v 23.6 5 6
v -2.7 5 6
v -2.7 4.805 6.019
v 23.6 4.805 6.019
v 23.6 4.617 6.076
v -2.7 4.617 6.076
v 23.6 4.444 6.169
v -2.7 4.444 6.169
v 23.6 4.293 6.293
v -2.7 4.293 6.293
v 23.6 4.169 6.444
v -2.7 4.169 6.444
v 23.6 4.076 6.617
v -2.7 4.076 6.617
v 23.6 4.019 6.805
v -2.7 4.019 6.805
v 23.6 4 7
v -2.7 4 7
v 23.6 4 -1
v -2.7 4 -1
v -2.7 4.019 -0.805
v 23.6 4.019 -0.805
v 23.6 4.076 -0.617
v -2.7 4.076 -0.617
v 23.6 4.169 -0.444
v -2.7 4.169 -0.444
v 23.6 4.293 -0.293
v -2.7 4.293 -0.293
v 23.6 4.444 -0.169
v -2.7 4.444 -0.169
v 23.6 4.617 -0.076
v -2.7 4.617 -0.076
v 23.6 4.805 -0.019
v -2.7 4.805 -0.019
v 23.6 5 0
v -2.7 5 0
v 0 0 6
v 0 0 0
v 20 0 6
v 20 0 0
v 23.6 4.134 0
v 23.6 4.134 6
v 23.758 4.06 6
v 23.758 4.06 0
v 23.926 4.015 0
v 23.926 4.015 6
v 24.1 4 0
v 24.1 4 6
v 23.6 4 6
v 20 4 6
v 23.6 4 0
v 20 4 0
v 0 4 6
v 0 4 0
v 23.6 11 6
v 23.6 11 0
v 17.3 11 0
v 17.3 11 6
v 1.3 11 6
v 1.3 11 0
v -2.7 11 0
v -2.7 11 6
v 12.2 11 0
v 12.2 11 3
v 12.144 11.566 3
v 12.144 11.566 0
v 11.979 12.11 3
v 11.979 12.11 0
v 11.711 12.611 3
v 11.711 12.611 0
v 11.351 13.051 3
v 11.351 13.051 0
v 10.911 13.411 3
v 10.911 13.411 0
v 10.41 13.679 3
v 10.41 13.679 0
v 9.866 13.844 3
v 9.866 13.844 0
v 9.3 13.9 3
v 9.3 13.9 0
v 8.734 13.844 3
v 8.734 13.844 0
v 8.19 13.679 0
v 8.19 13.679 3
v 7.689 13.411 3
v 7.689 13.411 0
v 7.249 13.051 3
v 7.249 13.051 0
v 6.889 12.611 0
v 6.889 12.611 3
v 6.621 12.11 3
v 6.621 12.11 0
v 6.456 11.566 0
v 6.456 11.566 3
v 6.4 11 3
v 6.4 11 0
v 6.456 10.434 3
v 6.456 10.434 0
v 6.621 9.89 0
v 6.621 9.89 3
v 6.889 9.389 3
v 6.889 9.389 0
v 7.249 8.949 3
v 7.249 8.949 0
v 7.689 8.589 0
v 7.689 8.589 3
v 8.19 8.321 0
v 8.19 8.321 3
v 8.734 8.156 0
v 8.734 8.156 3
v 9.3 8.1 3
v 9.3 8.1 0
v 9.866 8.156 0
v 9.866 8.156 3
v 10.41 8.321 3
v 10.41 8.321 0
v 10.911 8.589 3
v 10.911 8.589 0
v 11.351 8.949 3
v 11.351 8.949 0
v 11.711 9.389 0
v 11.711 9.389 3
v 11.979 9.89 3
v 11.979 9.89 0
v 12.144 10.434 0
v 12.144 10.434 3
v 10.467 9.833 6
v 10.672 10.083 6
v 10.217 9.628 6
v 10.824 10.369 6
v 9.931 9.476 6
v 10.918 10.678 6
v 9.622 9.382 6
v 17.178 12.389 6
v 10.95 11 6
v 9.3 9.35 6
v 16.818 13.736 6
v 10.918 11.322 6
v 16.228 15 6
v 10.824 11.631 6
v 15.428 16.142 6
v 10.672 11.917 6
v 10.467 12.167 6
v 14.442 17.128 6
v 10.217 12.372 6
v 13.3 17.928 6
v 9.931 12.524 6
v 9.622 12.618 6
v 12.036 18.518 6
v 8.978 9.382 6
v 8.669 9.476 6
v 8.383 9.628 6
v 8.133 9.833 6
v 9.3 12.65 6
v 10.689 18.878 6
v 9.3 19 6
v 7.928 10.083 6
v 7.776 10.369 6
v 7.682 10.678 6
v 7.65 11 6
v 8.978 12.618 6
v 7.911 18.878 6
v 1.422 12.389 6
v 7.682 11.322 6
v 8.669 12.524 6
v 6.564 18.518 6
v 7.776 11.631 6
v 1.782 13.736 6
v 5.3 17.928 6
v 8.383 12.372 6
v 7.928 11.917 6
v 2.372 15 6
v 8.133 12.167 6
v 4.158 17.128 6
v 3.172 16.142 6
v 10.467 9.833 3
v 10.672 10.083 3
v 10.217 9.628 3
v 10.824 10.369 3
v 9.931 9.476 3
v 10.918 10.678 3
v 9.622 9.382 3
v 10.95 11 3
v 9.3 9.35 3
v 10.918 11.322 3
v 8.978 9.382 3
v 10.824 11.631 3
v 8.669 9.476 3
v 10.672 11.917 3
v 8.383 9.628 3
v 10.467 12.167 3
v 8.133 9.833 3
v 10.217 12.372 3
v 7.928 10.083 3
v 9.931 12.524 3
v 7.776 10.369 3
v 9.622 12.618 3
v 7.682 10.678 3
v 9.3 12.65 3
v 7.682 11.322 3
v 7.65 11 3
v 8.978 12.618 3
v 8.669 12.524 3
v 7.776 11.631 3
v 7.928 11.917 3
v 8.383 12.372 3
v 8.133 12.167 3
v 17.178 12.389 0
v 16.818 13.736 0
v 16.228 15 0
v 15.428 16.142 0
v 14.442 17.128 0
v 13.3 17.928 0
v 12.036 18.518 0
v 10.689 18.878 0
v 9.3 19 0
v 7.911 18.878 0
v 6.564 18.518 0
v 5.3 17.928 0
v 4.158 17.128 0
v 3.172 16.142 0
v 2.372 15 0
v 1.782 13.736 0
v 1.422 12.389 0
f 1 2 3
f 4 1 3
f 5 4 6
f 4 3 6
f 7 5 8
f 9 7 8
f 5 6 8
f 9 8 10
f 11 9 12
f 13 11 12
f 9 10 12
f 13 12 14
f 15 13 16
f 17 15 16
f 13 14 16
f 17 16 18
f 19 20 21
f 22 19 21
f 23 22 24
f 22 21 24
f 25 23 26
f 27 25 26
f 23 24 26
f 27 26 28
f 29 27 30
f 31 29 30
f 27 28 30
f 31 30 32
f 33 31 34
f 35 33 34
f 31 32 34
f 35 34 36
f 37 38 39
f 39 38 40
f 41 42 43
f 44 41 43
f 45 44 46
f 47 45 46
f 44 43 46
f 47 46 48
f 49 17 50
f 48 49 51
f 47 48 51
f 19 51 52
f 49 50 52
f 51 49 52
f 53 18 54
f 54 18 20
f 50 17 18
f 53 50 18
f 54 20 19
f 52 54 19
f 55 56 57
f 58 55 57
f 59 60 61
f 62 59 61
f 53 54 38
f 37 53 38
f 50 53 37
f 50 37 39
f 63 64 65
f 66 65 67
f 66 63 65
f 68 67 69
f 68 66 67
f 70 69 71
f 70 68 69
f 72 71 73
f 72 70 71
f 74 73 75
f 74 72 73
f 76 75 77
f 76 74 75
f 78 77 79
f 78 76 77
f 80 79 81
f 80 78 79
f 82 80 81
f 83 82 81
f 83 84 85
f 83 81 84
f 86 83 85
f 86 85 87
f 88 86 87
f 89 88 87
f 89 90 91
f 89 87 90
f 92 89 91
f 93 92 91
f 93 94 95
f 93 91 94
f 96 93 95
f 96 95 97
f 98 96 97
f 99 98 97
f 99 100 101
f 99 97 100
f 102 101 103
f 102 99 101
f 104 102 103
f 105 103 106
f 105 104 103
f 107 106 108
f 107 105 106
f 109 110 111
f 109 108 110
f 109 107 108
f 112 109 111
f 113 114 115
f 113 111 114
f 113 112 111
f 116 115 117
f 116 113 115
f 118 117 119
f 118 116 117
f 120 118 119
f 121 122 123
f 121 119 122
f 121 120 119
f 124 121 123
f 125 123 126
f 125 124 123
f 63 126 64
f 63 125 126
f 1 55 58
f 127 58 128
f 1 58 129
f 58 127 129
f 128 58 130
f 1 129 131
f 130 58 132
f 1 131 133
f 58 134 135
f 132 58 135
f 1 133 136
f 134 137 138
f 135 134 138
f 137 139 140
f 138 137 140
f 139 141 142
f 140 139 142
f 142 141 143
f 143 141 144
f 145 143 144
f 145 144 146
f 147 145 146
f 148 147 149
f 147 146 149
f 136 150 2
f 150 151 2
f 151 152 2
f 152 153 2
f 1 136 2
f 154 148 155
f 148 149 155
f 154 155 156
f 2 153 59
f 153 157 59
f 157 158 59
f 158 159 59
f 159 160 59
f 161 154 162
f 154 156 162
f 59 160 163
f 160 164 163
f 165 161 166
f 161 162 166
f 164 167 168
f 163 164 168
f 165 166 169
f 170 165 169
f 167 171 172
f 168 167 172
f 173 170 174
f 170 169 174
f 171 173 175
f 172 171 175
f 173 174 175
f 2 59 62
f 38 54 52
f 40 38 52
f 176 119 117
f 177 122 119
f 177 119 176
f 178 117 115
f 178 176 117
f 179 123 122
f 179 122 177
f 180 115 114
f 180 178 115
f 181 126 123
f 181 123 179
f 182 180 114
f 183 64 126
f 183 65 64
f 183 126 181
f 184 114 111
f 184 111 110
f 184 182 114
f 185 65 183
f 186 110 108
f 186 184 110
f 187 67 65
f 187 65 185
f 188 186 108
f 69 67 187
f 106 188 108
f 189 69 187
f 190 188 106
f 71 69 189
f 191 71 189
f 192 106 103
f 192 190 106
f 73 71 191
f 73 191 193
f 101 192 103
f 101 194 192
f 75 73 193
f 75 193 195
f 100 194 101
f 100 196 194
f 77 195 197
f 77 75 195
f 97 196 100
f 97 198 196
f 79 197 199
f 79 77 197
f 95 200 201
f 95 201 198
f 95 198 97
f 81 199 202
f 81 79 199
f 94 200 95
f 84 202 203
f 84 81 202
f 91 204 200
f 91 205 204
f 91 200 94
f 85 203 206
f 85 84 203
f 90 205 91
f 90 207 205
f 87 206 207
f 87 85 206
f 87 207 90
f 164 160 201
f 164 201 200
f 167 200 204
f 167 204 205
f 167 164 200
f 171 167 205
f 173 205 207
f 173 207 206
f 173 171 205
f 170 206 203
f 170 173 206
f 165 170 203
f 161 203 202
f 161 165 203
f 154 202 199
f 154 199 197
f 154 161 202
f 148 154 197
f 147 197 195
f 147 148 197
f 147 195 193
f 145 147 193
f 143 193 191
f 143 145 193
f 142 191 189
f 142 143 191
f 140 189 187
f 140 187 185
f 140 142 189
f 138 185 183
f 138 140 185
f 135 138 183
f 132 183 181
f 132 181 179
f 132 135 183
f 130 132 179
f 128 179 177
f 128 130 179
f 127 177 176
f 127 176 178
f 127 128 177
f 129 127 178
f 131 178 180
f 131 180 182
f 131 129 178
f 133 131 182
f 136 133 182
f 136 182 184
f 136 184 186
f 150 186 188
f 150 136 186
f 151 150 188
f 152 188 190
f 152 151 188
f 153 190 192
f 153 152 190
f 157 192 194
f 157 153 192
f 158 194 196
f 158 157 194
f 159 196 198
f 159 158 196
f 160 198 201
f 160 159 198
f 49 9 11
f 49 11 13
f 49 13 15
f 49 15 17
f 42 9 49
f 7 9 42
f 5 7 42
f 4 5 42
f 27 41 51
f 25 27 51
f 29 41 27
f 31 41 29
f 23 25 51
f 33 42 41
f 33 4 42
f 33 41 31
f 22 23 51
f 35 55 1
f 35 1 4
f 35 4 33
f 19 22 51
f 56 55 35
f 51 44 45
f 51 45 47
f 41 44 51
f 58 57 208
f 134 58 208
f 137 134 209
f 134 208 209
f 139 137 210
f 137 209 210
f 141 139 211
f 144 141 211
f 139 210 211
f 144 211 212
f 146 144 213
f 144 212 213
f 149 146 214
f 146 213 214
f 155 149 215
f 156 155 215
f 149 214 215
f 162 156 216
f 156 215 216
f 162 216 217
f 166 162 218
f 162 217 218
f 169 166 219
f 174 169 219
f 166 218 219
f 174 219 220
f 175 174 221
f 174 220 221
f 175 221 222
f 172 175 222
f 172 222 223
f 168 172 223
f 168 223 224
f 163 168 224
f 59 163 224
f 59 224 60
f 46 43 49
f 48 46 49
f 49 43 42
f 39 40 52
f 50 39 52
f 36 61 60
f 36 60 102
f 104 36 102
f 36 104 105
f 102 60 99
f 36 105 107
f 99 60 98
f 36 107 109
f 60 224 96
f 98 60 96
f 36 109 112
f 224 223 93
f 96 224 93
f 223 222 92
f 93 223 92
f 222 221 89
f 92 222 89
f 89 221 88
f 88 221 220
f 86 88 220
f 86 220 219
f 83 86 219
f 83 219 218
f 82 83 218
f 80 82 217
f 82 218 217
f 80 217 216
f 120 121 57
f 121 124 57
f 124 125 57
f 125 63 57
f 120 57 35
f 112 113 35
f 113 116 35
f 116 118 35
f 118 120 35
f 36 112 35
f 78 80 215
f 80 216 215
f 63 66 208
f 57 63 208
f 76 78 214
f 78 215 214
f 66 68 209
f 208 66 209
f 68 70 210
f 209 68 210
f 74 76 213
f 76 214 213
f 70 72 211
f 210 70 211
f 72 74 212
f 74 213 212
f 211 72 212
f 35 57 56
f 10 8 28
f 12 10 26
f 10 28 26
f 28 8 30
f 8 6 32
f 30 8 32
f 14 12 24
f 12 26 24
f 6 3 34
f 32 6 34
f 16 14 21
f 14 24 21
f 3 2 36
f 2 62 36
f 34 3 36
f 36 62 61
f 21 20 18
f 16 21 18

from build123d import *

# Parameters (mm, degrees)
SKETCH1_R           = 2.9
BOSS_EXTRUDE1_DEPTH = 6
BOSS_EXTRUDE2_DEPTH = 26.3
BOSS_EXTRUDE3_DEPTH = 6
SKETCH5_R           = 2.9
SKETCH5_R_2         = 1.65
BOSS_EXTRUDE4_DEPTH = 3


with BuildPart() as part:
    # Sketch1 → Boss-Extrude1 (new body)
    with BuildSketch(Plane.XY):
        with BuildLine():
            Line((0, 0), (20, 0))
            Line((20, 0), (20, 4))
            Line((20, 4), (23.6, 4))
            Line((23.6, 4), (23.6, 11))
            Line((23.6, 11), (17.3, 11))
            ThreePointArc((17.3, 11), (9.3, 19), (1.3, 11))
            Line((1.3, 11), (-2.7, 11))
            Line((-2.7, 11), (-2.7, 4))
            Line((-2.7, 4), (0, 4))
            Line((0, 4), (0, 0))
        make_face()
        with Locations((9.3, 11)):
            Circle(SKETCH1_R, mode=Mode.SUBTRACT)
    extrude(amount=BOSS_EXTRUDE1_DEPTH)

    # Sketch2 → Boss-Extrude2 (add)
    with BuildSketch(Plane.ZY.offset(2.7)):
        with BuildLine():
            Line((6, 4), (6, 5))
            ThreePointArc((6, 5), (6.292893219, 4.292893219), (7, 4))
            Line((7, 4), (6, 4))
        make_face()
        with BuildLine():
            Line((0, 4), (-1, 4))
            ThreePointArc((-1, 4), (-0.292893219, 4.292893219), (0, 5))
            Line((0, 5), (0, 4))
        make_face()
    extrude(amount=-BOSS_EXTRUDE2_DEPTH)

    # Sketch4 → Boss-Extrude3 (add)
    with BuildSketch(Plane.XY.offset(6)):
        with BuildLine():
            Line((23.1, 4), (23.1, 5))
            ThreePointArc((23.1, 5), (23.392893219, 4.292893219), (24.1, 4))
            Line((24.1, 4), (23.1, 4))
        make_face()
        with BuildLine():
            Line((-1.5, 4), (-2.5, 4))
            ThreePointArc((-2.5, 4), (-1.792893219, 4.292893219), (-1.5, 5))
            Line((-1.5, 5), (-1.5, 4))
        make_face()
    extrude(amount=-BOSS_EXTRUDE3_DEPTH)

    # Sketch5 → Boss-Extrude4 (add)
    with BuildSketch(Plane(origin=(0, 0, 6), x_dir=(-1, 0, 0), z_dir=(0, 0, -1))):
        with Locations((-9.3, 11)):
            Circle(SKETCH5_R)
        with Locations((-9.3, 11)):
            Circle(SKETCH5_R_2, mode=Mode.SUBTRACT)
    extrude(amount=BOSS_EXTRUDE4_DEPTH)


solid = part.part
